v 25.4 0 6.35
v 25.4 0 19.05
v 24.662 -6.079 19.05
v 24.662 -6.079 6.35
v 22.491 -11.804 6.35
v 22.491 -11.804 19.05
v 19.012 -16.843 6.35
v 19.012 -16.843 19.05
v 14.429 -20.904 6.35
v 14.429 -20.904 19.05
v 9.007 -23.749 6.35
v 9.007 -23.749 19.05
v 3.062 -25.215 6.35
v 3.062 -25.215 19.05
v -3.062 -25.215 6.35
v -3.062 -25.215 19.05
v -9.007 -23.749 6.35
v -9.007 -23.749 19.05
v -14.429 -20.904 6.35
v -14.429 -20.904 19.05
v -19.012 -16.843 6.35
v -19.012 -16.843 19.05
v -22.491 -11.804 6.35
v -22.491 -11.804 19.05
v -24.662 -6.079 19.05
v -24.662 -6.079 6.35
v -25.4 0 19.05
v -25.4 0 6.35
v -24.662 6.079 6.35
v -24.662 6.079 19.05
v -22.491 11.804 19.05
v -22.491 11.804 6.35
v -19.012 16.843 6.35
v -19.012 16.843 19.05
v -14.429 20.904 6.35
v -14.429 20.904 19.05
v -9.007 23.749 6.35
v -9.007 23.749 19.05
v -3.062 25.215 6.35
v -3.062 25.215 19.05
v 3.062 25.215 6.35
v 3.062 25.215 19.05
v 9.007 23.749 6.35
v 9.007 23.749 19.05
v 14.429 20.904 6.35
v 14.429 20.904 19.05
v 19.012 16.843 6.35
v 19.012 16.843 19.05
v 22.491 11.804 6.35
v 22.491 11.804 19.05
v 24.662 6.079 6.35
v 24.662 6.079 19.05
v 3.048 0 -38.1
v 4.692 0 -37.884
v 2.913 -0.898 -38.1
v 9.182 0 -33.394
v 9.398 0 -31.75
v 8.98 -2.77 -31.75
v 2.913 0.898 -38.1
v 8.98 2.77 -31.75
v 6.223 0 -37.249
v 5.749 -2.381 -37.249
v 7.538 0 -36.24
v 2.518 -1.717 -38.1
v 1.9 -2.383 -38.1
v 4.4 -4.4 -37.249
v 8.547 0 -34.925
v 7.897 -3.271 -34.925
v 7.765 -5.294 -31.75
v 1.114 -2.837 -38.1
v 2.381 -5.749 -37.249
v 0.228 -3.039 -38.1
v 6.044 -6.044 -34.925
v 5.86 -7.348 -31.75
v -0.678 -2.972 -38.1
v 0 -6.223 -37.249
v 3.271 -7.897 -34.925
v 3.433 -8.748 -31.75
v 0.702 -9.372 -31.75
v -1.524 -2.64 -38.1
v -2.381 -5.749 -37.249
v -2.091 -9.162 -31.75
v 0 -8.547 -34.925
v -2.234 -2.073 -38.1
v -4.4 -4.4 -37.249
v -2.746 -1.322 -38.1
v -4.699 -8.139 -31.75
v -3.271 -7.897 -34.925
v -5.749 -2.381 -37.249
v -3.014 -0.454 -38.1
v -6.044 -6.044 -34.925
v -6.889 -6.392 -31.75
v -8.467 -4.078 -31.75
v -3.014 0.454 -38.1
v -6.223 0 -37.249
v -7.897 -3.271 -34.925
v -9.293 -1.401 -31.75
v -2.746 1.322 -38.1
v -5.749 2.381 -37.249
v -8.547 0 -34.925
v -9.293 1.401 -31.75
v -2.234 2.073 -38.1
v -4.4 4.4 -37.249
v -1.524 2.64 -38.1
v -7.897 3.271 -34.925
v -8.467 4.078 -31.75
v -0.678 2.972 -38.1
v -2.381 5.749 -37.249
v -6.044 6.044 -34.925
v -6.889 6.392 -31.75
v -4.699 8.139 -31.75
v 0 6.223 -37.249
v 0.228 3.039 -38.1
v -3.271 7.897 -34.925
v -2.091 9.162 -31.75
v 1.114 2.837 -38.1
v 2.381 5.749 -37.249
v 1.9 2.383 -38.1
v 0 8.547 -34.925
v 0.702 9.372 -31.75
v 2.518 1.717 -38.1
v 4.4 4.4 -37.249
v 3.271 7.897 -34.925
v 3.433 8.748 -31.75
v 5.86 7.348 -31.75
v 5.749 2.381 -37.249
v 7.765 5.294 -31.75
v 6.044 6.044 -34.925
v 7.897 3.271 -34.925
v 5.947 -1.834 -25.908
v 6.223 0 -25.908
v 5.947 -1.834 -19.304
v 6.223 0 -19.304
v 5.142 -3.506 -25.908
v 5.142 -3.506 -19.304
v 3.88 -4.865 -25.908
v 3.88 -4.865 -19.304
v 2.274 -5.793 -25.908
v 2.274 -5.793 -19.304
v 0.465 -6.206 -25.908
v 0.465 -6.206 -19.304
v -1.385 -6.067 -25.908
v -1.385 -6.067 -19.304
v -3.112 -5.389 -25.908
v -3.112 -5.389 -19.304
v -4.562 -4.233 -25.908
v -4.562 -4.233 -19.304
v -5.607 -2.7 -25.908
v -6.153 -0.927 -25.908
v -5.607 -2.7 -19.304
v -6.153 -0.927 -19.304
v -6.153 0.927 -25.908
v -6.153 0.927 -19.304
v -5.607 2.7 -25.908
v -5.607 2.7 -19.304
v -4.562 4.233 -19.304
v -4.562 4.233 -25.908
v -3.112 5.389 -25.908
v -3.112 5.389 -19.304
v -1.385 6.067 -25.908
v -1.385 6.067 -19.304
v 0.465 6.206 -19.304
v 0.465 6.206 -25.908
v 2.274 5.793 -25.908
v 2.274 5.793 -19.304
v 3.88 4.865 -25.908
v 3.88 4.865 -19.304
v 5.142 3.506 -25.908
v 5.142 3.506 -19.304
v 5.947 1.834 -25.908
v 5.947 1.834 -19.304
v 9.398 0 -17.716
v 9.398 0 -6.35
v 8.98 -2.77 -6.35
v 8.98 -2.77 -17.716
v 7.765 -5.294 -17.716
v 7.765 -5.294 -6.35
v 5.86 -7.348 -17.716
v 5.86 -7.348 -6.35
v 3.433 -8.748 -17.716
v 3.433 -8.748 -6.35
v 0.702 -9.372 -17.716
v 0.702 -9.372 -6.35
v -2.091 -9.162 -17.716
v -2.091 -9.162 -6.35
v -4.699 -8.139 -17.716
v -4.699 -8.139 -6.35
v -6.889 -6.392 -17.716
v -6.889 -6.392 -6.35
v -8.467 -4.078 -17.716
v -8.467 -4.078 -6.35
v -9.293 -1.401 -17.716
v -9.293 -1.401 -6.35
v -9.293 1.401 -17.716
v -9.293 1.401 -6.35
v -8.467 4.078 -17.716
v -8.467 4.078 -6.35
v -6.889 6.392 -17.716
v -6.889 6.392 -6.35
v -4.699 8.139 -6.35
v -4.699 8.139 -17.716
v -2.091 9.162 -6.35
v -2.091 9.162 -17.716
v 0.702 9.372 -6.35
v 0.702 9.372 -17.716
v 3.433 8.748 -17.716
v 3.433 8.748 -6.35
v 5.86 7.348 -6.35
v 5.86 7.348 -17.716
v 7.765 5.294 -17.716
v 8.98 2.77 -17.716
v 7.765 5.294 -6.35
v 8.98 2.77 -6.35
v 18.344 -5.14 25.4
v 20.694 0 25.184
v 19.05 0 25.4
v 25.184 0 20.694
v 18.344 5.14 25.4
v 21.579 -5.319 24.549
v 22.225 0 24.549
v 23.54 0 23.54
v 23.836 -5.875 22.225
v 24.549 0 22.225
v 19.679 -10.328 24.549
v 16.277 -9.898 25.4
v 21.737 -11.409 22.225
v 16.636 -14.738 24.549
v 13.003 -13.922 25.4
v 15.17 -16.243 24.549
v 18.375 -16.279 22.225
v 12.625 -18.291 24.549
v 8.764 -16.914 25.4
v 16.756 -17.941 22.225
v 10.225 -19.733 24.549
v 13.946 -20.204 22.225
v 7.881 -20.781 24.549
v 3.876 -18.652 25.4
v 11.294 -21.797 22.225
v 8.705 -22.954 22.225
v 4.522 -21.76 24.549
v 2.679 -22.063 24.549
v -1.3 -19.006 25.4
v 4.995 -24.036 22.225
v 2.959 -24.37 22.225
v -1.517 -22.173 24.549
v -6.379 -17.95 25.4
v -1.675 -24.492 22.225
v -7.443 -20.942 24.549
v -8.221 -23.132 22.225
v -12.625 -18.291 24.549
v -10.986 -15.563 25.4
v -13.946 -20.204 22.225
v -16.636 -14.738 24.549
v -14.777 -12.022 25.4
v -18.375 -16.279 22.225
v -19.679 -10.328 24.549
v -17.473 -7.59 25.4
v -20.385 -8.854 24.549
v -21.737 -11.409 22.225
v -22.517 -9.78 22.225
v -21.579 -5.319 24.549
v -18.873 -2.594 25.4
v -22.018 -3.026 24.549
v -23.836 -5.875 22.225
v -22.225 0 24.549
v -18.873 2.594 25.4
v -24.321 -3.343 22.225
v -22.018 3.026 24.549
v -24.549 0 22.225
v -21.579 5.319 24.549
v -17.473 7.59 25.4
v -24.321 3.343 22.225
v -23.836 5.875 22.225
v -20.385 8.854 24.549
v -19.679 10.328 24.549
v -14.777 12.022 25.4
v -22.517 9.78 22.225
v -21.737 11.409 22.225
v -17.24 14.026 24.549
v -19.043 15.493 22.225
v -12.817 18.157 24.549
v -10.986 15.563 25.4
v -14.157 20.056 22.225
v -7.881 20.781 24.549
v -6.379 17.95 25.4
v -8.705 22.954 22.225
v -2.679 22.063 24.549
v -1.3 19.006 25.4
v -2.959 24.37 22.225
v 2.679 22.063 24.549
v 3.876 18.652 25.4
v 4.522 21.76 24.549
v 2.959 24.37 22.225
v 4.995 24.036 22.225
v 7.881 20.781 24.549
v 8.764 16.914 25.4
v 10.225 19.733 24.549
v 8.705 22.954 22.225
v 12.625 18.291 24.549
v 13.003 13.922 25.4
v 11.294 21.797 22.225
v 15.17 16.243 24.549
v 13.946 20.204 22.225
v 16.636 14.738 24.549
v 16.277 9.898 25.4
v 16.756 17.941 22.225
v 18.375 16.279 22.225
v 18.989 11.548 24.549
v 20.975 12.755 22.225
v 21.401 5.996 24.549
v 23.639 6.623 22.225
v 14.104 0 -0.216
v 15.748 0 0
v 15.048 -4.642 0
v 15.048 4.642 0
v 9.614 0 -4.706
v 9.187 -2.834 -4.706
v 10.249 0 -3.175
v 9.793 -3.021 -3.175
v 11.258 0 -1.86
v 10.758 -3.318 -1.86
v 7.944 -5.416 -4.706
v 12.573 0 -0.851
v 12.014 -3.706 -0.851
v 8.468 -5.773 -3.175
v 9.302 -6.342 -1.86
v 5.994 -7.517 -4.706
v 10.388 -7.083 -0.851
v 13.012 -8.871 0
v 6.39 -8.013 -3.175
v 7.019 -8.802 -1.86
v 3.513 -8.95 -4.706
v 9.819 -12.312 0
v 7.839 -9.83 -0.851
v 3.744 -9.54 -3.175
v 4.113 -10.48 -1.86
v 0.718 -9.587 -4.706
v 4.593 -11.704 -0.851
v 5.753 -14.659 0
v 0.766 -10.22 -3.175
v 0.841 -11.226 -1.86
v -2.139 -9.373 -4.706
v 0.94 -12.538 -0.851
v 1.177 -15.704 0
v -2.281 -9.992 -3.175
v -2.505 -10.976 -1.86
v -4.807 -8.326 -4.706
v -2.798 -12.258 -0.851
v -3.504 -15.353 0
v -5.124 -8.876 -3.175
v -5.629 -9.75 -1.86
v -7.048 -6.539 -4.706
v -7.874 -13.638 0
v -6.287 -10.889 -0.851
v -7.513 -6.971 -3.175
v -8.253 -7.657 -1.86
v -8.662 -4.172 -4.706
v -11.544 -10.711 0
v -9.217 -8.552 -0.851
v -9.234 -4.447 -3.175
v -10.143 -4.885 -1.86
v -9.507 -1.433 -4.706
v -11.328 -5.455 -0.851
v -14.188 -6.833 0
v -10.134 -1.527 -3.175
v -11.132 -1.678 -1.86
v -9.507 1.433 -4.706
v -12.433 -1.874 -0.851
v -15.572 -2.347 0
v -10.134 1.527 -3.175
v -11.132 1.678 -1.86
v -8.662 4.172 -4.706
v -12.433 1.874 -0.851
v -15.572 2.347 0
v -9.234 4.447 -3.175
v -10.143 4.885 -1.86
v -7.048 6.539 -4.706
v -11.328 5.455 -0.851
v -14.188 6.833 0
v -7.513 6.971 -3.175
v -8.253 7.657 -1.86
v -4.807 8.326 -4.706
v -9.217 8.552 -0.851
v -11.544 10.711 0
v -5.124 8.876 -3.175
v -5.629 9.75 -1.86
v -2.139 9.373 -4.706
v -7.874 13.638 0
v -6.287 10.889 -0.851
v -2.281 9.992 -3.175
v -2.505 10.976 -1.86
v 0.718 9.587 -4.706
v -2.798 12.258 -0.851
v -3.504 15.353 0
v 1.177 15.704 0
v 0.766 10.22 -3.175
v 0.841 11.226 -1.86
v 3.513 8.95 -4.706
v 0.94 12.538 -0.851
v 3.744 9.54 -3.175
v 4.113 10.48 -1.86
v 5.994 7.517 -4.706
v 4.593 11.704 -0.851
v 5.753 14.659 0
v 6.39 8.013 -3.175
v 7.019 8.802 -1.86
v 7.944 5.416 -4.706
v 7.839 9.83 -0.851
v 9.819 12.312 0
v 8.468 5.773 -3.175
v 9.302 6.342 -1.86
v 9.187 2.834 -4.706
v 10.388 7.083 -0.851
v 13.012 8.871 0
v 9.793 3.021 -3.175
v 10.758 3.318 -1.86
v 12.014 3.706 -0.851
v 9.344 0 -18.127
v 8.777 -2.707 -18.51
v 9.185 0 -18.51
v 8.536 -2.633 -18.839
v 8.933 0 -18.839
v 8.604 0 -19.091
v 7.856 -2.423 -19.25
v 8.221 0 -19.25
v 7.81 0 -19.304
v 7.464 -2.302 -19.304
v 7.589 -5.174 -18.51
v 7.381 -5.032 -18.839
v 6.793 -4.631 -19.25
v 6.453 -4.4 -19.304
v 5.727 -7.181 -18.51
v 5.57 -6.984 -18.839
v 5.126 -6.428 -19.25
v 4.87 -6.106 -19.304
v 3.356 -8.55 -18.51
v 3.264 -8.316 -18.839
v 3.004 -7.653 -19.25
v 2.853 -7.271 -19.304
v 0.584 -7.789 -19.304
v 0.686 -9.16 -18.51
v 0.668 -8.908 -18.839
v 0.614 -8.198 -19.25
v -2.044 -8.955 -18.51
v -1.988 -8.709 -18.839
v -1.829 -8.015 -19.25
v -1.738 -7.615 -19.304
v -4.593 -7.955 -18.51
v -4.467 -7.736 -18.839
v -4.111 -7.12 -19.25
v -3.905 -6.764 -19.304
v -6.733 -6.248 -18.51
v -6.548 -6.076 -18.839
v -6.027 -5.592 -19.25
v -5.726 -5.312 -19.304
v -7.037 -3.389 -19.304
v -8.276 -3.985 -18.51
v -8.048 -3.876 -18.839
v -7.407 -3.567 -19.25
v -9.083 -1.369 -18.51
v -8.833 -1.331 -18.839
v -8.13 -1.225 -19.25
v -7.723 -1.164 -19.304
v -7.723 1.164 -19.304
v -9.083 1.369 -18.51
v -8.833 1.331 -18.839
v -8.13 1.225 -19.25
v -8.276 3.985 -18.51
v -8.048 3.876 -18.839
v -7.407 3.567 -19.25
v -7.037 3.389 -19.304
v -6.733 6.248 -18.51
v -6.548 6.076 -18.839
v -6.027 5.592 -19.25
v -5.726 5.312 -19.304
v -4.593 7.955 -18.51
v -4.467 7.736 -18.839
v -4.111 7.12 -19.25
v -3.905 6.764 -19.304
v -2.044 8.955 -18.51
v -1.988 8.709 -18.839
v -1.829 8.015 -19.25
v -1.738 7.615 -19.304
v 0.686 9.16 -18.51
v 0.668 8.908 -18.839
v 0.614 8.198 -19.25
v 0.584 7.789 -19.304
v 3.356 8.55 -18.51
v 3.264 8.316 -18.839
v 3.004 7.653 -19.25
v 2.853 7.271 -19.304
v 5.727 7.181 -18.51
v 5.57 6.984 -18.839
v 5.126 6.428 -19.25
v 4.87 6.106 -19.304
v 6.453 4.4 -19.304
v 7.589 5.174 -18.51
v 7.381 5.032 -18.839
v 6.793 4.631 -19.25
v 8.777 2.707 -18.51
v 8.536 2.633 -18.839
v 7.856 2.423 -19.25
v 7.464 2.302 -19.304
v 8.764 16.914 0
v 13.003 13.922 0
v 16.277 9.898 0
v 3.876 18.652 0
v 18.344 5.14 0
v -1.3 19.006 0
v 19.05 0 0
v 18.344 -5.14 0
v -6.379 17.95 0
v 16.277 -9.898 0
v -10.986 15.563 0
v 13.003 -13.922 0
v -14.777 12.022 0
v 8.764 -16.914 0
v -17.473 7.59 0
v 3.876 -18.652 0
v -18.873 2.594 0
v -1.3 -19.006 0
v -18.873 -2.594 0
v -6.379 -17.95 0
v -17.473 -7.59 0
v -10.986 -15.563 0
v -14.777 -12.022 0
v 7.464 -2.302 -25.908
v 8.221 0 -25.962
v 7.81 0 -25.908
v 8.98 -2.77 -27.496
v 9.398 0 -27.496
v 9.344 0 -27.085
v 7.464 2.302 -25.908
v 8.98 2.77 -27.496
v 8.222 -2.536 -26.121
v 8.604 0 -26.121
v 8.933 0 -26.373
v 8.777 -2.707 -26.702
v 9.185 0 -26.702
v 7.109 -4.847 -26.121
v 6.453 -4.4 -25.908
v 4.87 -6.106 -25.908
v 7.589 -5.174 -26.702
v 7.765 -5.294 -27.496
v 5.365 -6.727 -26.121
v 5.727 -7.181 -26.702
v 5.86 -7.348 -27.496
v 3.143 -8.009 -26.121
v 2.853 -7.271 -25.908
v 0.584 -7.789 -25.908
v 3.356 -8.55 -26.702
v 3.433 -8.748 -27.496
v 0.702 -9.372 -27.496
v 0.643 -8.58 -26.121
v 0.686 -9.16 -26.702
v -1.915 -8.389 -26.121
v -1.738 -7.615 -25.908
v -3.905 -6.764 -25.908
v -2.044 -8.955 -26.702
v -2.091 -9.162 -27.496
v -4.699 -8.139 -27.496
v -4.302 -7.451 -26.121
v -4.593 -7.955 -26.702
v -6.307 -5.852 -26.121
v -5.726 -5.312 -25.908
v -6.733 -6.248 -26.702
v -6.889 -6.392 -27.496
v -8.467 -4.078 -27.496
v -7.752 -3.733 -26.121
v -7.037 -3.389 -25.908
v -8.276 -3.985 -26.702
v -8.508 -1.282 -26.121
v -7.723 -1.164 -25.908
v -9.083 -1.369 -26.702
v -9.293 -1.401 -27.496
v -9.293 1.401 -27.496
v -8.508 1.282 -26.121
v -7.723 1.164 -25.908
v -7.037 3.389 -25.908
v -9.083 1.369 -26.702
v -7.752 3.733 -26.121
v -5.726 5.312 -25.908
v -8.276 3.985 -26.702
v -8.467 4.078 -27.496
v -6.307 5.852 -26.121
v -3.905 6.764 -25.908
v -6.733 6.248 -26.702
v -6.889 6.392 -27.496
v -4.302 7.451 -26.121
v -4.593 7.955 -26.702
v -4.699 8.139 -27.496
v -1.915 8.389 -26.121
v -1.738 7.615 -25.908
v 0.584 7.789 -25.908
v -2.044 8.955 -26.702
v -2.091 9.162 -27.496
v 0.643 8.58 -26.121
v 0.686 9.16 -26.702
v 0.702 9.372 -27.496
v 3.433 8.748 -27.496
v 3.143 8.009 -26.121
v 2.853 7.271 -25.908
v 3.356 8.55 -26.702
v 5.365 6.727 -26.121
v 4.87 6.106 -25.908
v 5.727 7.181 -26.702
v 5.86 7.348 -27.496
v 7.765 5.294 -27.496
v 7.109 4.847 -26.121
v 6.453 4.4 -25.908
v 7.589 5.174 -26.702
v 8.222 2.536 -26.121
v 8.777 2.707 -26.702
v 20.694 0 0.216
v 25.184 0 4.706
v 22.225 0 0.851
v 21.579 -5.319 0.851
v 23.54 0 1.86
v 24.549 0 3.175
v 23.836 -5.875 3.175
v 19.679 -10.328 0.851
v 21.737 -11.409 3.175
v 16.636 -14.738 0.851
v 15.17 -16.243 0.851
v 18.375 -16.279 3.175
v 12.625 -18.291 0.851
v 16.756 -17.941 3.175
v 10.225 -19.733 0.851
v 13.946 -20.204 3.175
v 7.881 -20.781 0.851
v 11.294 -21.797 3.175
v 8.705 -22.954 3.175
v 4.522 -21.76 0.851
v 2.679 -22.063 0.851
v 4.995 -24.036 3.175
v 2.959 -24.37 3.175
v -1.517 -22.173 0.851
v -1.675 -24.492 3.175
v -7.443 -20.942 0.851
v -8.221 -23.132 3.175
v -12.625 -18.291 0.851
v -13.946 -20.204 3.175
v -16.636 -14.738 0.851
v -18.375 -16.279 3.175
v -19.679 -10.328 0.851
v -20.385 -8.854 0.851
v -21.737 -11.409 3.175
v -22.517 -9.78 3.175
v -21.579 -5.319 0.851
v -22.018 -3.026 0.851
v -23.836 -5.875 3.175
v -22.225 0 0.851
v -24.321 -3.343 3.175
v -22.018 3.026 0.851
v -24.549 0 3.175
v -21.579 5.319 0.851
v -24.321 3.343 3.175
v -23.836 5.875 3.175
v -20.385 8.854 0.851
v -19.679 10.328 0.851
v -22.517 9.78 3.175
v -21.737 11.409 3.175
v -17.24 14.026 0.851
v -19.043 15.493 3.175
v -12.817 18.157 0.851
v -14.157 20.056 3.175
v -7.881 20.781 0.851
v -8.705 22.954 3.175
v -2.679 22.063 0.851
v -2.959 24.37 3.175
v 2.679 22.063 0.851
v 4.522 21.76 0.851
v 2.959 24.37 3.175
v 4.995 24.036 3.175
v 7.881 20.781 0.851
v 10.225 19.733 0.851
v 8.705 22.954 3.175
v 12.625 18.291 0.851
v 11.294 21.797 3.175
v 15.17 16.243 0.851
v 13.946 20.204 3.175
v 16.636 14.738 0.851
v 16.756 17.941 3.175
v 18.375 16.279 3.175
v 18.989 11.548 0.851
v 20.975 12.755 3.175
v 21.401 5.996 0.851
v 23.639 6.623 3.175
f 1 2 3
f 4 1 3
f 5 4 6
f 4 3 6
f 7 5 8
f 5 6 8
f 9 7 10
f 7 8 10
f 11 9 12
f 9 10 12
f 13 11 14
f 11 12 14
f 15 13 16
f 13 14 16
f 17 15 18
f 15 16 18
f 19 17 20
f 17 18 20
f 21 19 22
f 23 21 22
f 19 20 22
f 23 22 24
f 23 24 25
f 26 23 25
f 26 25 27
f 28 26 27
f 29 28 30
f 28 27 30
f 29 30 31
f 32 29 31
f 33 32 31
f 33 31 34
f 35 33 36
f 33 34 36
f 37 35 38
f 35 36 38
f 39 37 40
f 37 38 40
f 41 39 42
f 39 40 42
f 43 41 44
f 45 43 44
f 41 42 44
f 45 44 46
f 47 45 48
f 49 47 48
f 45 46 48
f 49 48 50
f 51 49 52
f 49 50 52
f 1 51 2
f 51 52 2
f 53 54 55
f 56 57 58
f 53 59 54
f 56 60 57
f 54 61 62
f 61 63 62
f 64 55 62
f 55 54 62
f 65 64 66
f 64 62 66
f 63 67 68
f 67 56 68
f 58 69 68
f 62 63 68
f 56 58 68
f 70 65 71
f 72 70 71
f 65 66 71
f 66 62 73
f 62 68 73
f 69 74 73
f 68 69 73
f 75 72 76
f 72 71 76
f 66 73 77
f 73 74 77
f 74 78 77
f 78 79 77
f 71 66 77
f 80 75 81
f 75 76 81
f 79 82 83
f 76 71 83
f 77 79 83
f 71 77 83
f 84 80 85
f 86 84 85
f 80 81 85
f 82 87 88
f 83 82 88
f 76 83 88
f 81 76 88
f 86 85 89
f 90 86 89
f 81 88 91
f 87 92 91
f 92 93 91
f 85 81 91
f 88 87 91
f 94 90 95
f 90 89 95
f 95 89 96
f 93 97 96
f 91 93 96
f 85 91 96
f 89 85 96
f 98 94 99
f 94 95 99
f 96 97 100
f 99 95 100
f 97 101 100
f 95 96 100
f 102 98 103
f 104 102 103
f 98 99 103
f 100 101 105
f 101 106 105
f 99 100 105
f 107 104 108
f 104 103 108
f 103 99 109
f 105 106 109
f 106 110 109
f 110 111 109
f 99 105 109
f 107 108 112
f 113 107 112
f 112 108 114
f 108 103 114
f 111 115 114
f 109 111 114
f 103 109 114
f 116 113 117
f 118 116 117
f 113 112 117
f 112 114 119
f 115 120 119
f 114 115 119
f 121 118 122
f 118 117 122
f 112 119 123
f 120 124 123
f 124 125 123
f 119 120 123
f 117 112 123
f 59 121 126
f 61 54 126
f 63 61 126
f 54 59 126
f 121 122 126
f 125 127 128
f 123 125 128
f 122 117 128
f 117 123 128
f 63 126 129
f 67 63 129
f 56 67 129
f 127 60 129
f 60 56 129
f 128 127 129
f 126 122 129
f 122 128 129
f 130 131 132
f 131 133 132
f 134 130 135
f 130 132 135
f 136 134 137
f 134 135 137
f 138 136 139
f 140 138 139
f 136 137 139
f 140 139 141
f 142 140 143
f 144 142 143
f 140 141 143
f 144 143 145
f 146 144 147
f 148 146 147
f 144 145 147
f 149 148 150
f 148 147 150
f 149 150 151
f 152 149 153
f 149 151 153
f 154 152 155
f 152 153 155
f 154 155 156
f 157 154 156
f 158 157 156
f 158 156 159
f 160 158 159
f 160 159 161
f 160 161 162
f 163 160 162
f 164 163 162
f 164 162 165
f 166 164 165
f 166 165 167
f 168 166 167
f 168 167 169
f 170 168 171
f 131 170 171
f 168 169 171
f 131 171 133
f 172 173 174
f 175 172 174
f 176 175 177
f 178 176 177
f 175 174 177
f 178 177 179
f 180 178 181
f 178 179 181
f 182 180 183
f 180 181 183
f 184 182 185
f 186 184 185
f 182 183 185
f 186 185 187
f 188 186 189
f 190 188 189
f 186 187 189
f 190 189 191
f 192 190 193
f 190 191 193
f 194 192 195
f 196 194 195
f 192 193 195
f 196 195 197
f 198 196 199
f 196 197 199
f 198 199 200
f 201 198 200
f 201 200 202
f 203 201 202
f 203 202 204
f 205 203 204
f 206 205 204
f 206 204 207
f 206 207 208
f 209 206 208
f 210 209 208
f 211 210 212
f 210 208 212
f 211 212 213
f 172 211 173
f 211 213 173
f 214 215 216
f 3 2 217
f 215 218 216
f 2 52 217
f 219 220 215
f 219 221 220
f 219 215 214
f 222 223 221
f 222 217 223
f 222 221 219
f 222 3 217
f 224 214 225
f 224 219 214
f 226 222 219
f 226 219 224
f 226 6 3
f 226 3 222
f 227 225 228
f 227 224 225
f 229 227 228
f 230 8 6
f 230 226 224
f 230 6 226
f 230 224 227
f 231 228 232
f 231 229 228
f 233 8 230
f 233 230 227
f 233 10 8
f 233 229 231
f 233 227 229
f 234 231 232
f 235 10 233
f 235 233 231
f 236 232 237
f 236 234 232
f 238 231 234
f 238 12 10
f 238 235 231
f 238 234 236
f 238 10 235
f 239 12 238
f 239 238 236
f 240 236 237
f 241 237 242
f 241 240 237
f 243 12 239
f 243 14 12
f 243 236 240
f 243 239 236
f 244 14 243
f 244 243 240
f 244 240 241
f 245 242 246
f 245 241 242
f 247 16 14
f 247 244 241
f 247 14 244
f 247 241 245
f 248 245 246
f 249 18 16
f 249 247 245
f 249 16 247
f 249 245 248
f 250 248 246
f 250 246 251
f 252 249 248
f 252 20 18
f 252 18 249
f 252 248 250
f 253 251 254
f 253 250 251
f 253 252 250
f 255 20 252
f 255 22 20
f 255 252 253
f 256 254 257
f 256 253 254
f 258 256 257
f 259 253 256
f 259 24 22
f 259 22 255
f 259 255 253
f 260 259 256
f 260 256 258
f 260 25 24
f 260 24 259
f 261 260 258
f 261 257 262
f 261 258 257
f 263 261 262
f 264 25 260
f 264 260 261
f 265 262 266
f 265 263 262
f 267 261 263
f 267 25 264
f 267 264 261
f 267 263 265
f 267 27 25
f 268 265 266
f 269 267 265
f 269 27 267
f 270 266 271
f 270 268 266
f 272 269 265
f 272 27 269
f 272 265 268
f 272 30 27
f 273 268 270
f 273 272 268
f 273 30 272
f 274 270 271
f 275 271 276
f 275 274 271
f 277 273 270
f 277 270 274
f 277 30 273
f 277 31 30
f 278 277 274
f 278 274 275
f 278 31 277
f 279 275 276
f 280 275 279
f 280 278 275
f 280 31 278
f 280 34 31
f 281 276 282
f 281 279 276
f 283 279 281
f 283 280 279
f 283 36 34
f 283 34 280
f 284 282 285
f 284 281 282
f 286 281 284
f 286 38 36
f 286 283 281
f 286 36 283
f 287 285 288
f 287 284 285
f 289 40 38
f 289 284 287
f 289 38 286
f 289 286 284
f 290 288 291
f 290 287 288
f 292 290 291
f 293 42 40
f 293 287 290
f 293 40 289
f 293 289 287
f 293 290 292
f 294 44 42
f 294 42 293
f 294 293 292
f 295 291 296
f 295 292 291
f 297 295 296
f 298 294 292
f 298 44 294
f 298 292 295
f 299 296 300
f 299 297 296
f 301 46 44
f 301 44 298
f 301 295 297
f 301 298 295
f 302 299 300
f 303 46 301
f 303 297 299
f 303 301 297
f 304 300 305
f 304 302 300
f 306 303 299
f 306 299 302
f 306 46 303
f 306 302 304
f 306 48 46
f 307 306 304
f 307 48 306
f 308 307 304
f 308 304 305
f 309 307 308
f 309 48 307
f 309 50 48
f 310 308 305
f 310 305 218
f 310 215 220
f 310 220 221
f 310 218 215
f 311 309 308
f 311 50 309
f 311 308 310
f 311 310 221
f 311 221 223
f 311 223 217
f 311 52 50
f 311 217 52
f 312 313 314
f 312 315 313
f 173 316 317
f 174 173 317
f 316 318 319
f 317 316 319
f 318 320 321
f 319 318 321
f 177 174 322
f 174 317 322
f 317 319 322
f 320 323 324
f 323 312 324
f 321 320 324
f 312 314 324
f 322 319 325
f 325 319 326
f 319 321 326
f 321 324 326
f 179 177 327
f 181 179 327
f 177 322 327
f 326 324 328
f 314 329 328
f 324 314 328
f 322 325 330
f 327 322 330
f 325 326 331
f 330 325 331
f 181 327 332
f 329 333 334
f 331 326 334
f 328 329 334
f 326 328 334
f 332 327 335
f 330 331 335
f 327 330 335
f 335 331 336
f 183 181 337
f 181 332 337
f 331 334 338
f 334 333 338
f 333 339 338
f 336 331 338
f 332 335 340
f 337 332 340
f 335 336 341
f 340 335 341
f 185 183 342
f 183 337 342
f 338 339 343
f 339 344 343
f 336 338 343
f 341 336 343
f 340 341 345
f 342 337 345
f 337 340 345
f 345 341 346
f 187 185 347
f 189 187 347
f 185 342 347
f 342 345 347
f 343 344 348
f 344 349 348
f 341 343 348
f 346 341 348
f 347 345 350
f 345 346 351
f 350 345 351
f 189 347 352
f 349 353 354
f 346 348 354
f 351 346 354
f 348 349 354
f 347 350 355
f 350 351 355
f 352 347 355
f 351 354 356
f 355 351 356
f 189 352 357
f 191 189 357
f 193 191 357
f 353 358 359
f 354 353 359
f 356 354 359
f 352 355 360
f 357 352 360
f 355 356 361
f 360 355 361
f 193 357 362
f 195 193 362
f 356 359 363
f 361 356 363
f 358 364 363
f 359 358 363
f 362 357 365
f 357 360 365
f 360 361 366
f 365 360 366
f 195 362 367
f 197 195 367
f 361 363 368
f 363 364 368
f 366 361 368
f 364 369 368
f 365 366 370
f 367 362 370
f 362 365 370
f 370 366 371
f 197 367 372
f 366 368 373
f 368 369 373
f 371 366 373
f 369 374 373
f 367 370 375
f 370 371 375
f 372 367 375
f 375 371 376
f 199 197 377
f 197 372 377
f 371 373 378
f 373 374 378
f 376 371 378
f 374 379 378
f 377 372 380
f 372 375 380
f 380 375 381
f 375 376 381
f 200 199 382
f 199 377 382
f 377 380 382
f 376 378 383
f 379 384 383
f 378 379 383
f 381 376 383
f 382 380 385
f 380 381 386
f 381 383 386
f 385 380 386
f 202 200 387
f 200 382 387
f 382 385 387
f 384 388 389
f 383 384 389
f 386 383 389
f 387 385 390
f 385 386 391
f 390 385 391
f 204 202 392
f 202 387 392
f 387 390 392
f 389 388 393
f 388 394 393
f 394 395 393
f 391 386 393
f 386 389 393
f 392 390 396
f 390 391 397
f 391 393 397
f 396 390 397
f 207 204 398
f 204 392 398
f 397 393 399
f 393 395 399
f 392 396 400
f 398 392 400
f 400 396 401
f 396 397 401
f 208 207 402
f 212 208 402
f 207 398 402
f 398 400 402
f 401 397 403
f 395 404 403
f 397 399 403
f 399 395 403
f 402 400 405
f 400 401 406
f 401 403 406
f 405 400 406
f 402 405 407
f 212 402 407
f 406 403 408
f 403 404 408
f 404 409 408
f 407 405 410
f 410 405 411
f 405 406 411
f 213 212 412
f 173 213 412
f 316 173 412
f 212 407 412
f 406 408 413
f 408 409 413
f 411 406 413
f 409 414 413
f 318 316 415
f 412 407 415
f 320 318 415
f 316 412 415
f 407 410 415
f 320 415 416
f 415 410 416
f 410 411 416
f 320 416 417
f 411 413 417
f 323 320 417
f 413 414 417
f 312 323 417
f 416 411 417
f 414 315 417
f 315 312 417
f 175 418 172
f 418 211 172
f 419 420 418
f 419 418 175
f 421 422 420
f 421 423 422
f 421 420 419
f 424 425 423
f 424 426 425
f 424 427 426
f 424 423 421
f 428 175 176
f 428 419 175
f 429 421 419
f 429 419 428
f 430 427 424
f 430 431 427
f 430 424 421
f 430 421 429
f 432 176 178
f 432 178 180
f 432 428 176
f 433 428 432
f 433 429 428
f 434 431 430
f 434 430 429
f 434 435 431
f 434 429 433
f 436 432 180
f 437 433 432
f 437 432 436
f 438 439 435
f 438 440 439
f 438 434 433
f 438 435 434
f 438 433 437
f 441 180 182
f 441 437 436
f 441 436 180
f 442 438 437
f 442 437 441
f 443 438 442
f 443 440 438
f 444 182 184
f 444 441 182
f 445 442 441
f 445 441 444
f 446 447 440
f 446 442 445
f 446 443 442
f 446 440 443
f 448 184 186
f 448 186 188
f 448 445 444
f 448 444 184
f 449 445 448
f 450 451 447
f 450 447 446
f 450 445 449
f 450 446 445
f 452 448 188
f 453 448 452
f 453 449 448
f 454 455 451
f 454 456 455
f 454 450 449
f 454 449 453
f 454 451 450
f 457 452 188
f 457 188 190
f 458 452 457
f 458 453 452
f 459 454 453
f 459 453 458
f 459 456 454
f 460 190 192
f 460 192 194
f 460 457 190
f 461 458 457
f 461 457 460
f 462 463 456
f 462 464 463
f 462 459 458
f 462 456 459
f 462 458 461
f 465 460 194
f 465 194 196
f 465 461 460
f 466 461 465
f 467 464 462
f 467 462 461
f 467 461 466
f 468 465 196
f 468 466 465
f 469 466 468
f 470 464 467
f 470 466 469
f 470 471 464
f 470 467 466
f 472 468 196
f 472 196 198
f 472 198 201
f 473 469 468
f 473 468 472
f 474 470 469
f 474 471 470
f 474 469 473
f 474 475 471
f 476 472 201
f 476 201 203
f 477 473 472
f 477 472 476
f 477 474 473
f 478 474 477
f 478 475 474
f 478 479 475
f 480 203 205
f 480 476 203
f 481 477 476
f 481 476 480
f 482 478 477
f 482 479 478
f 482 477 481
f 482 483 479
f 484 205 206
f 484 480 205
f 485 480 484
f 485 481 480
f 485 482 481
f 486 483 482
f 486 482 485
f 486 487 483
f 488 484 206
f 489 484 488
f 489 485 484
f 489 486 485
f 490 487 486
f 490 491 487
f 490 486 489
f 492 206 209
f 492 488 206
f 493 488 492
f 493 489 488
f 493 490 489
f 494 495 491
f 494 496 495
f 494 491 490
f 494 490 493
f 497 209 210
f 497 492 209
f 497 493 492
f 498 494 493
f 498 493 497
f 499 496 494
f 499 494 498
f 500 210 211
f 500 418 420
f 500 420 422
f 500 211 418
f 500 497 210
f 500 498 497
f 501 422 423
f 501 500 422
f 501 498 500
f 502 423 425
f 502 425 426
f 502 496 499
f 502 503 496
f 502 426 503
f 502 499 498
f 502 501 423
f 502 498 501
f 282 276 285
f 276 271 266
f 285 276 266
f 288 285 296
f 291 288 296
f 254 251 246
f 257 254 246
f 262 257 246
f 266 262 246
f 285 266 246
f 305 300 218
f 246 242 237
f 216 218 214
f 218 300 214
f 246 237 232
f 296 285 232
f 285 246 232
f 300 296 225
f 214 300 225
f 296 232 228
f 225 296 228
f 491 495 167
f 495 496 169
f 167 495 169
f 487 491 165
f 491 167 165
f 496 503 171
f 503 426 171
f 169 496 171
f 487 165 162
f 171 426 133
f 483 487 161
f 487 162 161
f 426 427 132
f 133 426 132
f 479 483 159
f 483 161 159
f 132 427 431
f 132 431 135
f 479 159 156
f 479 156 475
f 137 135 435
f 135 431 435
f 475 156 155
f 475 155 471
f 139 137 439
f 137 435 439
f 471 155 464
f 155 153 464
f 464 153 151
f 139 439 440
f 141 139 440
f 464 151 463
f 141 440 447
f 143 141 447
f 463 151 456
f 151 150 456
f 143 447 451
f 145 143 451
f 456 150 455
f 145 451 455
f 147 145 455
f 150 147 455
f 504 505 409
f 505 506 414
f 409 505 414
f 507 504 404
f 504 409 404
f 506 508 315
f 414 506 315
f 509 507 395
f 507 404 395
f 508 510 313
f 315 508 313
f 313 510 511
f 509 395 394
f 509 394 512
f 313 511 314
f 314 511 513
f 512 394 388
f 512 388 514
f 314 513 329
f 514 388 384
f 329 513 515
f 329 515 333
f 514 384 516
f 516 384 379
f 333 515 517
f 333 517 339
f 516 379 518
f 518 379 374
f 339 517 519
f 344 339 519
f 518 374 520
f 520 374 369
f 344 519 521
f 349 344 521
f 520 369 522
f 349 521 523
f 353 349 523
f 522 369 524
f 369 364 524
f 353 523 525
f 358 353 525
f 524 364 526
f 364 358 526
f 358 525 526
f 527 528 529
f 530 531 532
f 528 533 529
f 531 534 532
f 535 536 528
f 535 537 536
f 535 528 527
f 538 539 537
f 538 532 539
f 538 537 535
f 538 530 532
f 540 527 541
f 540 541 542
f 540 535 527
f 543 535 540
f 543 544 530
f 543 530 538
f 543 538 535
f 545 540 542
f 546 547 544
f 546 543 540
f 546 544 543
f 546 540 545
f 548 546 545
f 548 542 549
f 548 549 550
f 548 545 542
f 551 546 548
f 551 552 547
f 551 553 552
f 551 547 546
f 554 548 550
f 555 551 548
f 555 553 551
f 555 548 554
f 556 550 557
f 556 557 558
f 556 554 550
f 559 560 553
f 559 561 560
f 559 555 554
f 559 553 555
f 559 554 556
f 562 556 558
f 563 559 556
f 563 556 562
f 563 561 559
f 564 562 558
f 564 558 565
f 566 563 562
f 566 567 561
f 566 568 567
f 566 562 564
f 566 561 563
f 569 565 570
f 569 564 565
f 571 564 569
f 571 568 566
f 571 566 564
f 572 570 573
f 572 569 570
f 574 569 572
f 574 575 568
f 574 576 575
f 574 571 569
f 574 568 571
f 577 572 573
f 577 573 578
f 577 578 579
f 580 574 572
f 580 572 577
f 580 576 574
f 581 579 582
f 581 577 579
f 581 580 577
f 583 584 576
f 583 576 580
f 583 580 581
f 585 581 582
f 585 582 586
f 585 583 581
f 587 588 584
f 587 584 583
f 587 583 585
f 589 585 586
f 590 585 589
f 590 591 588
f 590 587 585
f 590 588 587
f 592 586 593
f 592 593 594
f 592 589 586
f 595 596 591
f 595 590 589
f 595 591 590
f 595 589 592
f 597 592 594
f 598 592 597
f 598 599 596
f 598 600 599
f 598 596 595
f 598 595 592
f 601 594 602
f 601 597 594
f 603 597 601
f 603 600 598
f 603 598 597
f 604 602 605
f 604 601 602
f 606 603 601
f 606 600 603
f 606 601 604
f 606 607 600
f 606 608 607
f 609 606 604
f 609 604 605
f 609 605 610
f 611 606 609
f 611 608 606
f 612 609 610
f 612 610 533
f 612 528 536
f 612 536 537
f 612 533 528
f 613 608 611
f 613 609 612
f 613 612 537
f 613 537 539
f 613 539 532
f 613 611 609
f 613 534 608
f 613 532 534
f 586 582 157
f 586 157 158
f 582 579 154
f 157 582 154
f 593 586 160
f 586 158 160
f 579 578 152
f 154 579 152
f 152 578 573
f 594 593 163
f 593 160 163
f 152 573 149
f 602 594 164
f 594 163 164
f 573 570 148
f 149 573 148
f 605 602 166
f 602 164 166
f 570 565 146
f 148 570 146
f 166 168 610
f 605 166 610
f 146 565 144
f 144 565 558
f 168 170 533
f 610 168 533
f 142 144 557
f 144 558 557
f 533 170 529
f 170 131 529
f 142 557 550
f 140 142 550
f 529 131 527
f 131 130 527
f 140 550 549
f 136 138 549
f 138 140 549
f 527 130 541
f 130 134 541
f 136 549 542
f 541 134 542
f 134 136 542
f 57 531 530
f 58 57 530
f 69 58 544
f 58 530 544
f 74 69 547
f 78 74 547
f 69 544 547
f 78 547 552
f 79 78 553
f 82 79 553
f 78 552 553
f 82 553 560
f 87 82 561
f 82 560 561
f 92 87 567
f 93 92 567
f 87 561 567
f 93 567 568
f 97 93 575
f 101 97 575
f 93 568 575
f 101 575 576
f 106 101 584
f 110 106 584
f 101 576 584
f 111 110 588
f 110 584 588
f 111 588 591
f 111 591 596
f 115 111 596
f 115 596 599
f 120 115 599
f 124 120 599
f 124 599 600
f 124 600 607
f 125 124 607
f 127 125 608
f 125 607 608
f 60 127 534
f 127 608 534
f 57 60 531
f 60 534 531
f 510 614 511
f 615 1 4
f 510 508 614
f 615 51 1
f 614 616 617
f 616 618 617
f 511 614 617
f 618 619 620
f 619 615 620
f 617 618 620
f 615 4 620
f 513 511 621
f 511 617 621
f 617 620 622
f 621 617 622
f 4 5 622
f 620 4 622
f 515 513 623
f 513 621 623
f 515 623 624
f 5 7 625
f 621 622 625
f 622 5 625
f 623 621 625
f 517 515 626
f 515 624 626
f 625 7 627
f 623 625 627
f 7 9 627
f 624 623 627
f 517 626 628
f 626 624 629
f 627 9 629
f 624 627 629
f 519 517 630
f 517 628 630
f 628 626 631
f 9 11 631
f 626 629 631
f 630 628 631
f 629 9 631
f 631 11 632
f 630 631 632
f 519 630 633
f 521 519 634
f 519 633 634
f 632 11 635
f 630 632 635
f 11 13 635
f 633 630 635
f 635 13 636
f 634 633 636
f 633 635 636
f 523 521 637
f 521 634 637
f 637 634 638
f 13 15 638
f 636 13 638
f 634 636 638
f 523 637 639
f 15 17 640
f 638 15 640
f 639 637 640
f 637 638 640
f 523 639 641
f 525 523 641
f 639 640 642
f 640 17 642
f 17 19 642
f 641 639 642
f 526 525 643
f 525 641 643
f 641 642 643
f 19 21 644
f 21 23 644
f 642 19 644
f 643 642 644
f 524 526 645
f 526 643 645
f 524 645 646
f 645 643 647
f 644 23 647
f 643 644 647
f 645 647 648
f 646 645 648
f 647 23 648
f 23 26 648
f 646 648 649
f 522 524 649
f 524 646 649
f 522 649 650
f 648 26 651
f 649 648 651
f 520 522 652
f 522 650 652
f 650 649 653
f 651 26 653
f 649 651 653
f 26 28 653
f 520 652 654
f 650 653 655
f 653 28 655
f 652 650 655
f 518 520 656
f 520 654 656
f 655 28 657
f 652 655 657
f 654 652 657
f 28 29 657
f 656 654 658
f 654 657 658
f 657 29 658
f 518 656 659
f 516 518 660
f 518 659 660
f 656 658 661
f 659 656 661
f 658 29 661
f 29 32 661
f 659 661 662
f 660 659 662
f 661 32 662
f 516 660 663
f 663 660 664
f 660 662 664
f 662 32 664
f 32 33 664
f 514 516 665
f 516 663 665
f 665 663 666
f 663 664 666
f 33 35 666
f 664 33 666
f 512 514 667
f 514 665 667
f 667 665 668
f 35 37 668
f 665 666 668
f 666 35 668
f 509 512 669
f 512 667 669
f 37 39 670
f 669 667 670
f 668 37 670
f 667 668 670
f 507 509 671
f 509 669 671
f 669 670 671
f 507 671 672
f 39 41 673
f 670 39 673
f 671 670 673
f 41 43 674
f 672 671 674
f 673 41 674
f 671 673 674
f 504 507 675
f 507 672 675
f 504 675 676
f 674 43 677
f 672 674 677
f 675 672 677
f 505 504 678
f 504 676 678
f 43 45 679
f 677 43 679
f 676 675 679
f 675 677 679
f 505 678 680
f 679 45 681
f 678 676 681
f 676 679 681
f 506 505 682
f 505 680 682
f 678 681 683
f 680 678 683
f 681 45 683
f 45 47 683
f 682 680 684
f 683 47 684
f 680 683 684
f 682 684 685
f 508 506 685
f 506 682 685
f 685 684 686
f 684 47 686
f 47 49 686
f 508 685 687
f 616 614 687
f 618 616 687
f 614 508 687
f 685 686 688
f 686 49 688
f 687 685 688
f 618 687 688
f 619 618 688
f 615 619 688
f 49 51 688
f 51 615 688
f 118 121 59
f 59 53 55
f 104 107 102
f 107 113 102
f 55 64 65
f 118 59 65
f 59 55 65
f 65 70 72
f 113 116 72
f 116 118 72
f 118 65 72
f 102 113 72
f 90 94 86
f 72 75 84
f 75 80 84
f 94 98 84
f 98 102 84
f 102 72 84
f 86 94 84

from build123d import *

# Parameters (mm, degrees)
F2_R = 6.35
F3_R = 1.5875


with BuildPart() as f1:
    # F0 (on Front) → F1 (revolve)
    with BuildSketch(Plane.XZ):
        Polygon((25.4, 25.4), (0, 25.4), (0, -38.1), (9.398, -38.1), (9.398, -25.908), (6.223, -25.908), (6.223, -19.304), (9.398, -19.304), (9.398, 0), (25.4, 0), align=None)
    revolve(axis=Axis((0, 0, 0.492247), (0, 0, -1)))

    # F2
    f2_edges = [f1.edges().sort_by_distance(p)[0] for p in [
        (-25.4, 0, 0),
        (-25.4, 0, 25.4),
        (25.4, 0, 12.7),
        (-9.398, 0, -38.1),
        (-9.398, 0, 0),
    ]]
    fillet(f2_edges, radius=F2_R)

    # F3
    f3_edges = [f1.edges().sort_by_distance(p)[0] for p in [
        (-9.398, 0, -19.304),
        (-9.398, 0, -25.908),
    ]]
    fillet(f3_edges, radius=F3_R)


solid = f1.part
